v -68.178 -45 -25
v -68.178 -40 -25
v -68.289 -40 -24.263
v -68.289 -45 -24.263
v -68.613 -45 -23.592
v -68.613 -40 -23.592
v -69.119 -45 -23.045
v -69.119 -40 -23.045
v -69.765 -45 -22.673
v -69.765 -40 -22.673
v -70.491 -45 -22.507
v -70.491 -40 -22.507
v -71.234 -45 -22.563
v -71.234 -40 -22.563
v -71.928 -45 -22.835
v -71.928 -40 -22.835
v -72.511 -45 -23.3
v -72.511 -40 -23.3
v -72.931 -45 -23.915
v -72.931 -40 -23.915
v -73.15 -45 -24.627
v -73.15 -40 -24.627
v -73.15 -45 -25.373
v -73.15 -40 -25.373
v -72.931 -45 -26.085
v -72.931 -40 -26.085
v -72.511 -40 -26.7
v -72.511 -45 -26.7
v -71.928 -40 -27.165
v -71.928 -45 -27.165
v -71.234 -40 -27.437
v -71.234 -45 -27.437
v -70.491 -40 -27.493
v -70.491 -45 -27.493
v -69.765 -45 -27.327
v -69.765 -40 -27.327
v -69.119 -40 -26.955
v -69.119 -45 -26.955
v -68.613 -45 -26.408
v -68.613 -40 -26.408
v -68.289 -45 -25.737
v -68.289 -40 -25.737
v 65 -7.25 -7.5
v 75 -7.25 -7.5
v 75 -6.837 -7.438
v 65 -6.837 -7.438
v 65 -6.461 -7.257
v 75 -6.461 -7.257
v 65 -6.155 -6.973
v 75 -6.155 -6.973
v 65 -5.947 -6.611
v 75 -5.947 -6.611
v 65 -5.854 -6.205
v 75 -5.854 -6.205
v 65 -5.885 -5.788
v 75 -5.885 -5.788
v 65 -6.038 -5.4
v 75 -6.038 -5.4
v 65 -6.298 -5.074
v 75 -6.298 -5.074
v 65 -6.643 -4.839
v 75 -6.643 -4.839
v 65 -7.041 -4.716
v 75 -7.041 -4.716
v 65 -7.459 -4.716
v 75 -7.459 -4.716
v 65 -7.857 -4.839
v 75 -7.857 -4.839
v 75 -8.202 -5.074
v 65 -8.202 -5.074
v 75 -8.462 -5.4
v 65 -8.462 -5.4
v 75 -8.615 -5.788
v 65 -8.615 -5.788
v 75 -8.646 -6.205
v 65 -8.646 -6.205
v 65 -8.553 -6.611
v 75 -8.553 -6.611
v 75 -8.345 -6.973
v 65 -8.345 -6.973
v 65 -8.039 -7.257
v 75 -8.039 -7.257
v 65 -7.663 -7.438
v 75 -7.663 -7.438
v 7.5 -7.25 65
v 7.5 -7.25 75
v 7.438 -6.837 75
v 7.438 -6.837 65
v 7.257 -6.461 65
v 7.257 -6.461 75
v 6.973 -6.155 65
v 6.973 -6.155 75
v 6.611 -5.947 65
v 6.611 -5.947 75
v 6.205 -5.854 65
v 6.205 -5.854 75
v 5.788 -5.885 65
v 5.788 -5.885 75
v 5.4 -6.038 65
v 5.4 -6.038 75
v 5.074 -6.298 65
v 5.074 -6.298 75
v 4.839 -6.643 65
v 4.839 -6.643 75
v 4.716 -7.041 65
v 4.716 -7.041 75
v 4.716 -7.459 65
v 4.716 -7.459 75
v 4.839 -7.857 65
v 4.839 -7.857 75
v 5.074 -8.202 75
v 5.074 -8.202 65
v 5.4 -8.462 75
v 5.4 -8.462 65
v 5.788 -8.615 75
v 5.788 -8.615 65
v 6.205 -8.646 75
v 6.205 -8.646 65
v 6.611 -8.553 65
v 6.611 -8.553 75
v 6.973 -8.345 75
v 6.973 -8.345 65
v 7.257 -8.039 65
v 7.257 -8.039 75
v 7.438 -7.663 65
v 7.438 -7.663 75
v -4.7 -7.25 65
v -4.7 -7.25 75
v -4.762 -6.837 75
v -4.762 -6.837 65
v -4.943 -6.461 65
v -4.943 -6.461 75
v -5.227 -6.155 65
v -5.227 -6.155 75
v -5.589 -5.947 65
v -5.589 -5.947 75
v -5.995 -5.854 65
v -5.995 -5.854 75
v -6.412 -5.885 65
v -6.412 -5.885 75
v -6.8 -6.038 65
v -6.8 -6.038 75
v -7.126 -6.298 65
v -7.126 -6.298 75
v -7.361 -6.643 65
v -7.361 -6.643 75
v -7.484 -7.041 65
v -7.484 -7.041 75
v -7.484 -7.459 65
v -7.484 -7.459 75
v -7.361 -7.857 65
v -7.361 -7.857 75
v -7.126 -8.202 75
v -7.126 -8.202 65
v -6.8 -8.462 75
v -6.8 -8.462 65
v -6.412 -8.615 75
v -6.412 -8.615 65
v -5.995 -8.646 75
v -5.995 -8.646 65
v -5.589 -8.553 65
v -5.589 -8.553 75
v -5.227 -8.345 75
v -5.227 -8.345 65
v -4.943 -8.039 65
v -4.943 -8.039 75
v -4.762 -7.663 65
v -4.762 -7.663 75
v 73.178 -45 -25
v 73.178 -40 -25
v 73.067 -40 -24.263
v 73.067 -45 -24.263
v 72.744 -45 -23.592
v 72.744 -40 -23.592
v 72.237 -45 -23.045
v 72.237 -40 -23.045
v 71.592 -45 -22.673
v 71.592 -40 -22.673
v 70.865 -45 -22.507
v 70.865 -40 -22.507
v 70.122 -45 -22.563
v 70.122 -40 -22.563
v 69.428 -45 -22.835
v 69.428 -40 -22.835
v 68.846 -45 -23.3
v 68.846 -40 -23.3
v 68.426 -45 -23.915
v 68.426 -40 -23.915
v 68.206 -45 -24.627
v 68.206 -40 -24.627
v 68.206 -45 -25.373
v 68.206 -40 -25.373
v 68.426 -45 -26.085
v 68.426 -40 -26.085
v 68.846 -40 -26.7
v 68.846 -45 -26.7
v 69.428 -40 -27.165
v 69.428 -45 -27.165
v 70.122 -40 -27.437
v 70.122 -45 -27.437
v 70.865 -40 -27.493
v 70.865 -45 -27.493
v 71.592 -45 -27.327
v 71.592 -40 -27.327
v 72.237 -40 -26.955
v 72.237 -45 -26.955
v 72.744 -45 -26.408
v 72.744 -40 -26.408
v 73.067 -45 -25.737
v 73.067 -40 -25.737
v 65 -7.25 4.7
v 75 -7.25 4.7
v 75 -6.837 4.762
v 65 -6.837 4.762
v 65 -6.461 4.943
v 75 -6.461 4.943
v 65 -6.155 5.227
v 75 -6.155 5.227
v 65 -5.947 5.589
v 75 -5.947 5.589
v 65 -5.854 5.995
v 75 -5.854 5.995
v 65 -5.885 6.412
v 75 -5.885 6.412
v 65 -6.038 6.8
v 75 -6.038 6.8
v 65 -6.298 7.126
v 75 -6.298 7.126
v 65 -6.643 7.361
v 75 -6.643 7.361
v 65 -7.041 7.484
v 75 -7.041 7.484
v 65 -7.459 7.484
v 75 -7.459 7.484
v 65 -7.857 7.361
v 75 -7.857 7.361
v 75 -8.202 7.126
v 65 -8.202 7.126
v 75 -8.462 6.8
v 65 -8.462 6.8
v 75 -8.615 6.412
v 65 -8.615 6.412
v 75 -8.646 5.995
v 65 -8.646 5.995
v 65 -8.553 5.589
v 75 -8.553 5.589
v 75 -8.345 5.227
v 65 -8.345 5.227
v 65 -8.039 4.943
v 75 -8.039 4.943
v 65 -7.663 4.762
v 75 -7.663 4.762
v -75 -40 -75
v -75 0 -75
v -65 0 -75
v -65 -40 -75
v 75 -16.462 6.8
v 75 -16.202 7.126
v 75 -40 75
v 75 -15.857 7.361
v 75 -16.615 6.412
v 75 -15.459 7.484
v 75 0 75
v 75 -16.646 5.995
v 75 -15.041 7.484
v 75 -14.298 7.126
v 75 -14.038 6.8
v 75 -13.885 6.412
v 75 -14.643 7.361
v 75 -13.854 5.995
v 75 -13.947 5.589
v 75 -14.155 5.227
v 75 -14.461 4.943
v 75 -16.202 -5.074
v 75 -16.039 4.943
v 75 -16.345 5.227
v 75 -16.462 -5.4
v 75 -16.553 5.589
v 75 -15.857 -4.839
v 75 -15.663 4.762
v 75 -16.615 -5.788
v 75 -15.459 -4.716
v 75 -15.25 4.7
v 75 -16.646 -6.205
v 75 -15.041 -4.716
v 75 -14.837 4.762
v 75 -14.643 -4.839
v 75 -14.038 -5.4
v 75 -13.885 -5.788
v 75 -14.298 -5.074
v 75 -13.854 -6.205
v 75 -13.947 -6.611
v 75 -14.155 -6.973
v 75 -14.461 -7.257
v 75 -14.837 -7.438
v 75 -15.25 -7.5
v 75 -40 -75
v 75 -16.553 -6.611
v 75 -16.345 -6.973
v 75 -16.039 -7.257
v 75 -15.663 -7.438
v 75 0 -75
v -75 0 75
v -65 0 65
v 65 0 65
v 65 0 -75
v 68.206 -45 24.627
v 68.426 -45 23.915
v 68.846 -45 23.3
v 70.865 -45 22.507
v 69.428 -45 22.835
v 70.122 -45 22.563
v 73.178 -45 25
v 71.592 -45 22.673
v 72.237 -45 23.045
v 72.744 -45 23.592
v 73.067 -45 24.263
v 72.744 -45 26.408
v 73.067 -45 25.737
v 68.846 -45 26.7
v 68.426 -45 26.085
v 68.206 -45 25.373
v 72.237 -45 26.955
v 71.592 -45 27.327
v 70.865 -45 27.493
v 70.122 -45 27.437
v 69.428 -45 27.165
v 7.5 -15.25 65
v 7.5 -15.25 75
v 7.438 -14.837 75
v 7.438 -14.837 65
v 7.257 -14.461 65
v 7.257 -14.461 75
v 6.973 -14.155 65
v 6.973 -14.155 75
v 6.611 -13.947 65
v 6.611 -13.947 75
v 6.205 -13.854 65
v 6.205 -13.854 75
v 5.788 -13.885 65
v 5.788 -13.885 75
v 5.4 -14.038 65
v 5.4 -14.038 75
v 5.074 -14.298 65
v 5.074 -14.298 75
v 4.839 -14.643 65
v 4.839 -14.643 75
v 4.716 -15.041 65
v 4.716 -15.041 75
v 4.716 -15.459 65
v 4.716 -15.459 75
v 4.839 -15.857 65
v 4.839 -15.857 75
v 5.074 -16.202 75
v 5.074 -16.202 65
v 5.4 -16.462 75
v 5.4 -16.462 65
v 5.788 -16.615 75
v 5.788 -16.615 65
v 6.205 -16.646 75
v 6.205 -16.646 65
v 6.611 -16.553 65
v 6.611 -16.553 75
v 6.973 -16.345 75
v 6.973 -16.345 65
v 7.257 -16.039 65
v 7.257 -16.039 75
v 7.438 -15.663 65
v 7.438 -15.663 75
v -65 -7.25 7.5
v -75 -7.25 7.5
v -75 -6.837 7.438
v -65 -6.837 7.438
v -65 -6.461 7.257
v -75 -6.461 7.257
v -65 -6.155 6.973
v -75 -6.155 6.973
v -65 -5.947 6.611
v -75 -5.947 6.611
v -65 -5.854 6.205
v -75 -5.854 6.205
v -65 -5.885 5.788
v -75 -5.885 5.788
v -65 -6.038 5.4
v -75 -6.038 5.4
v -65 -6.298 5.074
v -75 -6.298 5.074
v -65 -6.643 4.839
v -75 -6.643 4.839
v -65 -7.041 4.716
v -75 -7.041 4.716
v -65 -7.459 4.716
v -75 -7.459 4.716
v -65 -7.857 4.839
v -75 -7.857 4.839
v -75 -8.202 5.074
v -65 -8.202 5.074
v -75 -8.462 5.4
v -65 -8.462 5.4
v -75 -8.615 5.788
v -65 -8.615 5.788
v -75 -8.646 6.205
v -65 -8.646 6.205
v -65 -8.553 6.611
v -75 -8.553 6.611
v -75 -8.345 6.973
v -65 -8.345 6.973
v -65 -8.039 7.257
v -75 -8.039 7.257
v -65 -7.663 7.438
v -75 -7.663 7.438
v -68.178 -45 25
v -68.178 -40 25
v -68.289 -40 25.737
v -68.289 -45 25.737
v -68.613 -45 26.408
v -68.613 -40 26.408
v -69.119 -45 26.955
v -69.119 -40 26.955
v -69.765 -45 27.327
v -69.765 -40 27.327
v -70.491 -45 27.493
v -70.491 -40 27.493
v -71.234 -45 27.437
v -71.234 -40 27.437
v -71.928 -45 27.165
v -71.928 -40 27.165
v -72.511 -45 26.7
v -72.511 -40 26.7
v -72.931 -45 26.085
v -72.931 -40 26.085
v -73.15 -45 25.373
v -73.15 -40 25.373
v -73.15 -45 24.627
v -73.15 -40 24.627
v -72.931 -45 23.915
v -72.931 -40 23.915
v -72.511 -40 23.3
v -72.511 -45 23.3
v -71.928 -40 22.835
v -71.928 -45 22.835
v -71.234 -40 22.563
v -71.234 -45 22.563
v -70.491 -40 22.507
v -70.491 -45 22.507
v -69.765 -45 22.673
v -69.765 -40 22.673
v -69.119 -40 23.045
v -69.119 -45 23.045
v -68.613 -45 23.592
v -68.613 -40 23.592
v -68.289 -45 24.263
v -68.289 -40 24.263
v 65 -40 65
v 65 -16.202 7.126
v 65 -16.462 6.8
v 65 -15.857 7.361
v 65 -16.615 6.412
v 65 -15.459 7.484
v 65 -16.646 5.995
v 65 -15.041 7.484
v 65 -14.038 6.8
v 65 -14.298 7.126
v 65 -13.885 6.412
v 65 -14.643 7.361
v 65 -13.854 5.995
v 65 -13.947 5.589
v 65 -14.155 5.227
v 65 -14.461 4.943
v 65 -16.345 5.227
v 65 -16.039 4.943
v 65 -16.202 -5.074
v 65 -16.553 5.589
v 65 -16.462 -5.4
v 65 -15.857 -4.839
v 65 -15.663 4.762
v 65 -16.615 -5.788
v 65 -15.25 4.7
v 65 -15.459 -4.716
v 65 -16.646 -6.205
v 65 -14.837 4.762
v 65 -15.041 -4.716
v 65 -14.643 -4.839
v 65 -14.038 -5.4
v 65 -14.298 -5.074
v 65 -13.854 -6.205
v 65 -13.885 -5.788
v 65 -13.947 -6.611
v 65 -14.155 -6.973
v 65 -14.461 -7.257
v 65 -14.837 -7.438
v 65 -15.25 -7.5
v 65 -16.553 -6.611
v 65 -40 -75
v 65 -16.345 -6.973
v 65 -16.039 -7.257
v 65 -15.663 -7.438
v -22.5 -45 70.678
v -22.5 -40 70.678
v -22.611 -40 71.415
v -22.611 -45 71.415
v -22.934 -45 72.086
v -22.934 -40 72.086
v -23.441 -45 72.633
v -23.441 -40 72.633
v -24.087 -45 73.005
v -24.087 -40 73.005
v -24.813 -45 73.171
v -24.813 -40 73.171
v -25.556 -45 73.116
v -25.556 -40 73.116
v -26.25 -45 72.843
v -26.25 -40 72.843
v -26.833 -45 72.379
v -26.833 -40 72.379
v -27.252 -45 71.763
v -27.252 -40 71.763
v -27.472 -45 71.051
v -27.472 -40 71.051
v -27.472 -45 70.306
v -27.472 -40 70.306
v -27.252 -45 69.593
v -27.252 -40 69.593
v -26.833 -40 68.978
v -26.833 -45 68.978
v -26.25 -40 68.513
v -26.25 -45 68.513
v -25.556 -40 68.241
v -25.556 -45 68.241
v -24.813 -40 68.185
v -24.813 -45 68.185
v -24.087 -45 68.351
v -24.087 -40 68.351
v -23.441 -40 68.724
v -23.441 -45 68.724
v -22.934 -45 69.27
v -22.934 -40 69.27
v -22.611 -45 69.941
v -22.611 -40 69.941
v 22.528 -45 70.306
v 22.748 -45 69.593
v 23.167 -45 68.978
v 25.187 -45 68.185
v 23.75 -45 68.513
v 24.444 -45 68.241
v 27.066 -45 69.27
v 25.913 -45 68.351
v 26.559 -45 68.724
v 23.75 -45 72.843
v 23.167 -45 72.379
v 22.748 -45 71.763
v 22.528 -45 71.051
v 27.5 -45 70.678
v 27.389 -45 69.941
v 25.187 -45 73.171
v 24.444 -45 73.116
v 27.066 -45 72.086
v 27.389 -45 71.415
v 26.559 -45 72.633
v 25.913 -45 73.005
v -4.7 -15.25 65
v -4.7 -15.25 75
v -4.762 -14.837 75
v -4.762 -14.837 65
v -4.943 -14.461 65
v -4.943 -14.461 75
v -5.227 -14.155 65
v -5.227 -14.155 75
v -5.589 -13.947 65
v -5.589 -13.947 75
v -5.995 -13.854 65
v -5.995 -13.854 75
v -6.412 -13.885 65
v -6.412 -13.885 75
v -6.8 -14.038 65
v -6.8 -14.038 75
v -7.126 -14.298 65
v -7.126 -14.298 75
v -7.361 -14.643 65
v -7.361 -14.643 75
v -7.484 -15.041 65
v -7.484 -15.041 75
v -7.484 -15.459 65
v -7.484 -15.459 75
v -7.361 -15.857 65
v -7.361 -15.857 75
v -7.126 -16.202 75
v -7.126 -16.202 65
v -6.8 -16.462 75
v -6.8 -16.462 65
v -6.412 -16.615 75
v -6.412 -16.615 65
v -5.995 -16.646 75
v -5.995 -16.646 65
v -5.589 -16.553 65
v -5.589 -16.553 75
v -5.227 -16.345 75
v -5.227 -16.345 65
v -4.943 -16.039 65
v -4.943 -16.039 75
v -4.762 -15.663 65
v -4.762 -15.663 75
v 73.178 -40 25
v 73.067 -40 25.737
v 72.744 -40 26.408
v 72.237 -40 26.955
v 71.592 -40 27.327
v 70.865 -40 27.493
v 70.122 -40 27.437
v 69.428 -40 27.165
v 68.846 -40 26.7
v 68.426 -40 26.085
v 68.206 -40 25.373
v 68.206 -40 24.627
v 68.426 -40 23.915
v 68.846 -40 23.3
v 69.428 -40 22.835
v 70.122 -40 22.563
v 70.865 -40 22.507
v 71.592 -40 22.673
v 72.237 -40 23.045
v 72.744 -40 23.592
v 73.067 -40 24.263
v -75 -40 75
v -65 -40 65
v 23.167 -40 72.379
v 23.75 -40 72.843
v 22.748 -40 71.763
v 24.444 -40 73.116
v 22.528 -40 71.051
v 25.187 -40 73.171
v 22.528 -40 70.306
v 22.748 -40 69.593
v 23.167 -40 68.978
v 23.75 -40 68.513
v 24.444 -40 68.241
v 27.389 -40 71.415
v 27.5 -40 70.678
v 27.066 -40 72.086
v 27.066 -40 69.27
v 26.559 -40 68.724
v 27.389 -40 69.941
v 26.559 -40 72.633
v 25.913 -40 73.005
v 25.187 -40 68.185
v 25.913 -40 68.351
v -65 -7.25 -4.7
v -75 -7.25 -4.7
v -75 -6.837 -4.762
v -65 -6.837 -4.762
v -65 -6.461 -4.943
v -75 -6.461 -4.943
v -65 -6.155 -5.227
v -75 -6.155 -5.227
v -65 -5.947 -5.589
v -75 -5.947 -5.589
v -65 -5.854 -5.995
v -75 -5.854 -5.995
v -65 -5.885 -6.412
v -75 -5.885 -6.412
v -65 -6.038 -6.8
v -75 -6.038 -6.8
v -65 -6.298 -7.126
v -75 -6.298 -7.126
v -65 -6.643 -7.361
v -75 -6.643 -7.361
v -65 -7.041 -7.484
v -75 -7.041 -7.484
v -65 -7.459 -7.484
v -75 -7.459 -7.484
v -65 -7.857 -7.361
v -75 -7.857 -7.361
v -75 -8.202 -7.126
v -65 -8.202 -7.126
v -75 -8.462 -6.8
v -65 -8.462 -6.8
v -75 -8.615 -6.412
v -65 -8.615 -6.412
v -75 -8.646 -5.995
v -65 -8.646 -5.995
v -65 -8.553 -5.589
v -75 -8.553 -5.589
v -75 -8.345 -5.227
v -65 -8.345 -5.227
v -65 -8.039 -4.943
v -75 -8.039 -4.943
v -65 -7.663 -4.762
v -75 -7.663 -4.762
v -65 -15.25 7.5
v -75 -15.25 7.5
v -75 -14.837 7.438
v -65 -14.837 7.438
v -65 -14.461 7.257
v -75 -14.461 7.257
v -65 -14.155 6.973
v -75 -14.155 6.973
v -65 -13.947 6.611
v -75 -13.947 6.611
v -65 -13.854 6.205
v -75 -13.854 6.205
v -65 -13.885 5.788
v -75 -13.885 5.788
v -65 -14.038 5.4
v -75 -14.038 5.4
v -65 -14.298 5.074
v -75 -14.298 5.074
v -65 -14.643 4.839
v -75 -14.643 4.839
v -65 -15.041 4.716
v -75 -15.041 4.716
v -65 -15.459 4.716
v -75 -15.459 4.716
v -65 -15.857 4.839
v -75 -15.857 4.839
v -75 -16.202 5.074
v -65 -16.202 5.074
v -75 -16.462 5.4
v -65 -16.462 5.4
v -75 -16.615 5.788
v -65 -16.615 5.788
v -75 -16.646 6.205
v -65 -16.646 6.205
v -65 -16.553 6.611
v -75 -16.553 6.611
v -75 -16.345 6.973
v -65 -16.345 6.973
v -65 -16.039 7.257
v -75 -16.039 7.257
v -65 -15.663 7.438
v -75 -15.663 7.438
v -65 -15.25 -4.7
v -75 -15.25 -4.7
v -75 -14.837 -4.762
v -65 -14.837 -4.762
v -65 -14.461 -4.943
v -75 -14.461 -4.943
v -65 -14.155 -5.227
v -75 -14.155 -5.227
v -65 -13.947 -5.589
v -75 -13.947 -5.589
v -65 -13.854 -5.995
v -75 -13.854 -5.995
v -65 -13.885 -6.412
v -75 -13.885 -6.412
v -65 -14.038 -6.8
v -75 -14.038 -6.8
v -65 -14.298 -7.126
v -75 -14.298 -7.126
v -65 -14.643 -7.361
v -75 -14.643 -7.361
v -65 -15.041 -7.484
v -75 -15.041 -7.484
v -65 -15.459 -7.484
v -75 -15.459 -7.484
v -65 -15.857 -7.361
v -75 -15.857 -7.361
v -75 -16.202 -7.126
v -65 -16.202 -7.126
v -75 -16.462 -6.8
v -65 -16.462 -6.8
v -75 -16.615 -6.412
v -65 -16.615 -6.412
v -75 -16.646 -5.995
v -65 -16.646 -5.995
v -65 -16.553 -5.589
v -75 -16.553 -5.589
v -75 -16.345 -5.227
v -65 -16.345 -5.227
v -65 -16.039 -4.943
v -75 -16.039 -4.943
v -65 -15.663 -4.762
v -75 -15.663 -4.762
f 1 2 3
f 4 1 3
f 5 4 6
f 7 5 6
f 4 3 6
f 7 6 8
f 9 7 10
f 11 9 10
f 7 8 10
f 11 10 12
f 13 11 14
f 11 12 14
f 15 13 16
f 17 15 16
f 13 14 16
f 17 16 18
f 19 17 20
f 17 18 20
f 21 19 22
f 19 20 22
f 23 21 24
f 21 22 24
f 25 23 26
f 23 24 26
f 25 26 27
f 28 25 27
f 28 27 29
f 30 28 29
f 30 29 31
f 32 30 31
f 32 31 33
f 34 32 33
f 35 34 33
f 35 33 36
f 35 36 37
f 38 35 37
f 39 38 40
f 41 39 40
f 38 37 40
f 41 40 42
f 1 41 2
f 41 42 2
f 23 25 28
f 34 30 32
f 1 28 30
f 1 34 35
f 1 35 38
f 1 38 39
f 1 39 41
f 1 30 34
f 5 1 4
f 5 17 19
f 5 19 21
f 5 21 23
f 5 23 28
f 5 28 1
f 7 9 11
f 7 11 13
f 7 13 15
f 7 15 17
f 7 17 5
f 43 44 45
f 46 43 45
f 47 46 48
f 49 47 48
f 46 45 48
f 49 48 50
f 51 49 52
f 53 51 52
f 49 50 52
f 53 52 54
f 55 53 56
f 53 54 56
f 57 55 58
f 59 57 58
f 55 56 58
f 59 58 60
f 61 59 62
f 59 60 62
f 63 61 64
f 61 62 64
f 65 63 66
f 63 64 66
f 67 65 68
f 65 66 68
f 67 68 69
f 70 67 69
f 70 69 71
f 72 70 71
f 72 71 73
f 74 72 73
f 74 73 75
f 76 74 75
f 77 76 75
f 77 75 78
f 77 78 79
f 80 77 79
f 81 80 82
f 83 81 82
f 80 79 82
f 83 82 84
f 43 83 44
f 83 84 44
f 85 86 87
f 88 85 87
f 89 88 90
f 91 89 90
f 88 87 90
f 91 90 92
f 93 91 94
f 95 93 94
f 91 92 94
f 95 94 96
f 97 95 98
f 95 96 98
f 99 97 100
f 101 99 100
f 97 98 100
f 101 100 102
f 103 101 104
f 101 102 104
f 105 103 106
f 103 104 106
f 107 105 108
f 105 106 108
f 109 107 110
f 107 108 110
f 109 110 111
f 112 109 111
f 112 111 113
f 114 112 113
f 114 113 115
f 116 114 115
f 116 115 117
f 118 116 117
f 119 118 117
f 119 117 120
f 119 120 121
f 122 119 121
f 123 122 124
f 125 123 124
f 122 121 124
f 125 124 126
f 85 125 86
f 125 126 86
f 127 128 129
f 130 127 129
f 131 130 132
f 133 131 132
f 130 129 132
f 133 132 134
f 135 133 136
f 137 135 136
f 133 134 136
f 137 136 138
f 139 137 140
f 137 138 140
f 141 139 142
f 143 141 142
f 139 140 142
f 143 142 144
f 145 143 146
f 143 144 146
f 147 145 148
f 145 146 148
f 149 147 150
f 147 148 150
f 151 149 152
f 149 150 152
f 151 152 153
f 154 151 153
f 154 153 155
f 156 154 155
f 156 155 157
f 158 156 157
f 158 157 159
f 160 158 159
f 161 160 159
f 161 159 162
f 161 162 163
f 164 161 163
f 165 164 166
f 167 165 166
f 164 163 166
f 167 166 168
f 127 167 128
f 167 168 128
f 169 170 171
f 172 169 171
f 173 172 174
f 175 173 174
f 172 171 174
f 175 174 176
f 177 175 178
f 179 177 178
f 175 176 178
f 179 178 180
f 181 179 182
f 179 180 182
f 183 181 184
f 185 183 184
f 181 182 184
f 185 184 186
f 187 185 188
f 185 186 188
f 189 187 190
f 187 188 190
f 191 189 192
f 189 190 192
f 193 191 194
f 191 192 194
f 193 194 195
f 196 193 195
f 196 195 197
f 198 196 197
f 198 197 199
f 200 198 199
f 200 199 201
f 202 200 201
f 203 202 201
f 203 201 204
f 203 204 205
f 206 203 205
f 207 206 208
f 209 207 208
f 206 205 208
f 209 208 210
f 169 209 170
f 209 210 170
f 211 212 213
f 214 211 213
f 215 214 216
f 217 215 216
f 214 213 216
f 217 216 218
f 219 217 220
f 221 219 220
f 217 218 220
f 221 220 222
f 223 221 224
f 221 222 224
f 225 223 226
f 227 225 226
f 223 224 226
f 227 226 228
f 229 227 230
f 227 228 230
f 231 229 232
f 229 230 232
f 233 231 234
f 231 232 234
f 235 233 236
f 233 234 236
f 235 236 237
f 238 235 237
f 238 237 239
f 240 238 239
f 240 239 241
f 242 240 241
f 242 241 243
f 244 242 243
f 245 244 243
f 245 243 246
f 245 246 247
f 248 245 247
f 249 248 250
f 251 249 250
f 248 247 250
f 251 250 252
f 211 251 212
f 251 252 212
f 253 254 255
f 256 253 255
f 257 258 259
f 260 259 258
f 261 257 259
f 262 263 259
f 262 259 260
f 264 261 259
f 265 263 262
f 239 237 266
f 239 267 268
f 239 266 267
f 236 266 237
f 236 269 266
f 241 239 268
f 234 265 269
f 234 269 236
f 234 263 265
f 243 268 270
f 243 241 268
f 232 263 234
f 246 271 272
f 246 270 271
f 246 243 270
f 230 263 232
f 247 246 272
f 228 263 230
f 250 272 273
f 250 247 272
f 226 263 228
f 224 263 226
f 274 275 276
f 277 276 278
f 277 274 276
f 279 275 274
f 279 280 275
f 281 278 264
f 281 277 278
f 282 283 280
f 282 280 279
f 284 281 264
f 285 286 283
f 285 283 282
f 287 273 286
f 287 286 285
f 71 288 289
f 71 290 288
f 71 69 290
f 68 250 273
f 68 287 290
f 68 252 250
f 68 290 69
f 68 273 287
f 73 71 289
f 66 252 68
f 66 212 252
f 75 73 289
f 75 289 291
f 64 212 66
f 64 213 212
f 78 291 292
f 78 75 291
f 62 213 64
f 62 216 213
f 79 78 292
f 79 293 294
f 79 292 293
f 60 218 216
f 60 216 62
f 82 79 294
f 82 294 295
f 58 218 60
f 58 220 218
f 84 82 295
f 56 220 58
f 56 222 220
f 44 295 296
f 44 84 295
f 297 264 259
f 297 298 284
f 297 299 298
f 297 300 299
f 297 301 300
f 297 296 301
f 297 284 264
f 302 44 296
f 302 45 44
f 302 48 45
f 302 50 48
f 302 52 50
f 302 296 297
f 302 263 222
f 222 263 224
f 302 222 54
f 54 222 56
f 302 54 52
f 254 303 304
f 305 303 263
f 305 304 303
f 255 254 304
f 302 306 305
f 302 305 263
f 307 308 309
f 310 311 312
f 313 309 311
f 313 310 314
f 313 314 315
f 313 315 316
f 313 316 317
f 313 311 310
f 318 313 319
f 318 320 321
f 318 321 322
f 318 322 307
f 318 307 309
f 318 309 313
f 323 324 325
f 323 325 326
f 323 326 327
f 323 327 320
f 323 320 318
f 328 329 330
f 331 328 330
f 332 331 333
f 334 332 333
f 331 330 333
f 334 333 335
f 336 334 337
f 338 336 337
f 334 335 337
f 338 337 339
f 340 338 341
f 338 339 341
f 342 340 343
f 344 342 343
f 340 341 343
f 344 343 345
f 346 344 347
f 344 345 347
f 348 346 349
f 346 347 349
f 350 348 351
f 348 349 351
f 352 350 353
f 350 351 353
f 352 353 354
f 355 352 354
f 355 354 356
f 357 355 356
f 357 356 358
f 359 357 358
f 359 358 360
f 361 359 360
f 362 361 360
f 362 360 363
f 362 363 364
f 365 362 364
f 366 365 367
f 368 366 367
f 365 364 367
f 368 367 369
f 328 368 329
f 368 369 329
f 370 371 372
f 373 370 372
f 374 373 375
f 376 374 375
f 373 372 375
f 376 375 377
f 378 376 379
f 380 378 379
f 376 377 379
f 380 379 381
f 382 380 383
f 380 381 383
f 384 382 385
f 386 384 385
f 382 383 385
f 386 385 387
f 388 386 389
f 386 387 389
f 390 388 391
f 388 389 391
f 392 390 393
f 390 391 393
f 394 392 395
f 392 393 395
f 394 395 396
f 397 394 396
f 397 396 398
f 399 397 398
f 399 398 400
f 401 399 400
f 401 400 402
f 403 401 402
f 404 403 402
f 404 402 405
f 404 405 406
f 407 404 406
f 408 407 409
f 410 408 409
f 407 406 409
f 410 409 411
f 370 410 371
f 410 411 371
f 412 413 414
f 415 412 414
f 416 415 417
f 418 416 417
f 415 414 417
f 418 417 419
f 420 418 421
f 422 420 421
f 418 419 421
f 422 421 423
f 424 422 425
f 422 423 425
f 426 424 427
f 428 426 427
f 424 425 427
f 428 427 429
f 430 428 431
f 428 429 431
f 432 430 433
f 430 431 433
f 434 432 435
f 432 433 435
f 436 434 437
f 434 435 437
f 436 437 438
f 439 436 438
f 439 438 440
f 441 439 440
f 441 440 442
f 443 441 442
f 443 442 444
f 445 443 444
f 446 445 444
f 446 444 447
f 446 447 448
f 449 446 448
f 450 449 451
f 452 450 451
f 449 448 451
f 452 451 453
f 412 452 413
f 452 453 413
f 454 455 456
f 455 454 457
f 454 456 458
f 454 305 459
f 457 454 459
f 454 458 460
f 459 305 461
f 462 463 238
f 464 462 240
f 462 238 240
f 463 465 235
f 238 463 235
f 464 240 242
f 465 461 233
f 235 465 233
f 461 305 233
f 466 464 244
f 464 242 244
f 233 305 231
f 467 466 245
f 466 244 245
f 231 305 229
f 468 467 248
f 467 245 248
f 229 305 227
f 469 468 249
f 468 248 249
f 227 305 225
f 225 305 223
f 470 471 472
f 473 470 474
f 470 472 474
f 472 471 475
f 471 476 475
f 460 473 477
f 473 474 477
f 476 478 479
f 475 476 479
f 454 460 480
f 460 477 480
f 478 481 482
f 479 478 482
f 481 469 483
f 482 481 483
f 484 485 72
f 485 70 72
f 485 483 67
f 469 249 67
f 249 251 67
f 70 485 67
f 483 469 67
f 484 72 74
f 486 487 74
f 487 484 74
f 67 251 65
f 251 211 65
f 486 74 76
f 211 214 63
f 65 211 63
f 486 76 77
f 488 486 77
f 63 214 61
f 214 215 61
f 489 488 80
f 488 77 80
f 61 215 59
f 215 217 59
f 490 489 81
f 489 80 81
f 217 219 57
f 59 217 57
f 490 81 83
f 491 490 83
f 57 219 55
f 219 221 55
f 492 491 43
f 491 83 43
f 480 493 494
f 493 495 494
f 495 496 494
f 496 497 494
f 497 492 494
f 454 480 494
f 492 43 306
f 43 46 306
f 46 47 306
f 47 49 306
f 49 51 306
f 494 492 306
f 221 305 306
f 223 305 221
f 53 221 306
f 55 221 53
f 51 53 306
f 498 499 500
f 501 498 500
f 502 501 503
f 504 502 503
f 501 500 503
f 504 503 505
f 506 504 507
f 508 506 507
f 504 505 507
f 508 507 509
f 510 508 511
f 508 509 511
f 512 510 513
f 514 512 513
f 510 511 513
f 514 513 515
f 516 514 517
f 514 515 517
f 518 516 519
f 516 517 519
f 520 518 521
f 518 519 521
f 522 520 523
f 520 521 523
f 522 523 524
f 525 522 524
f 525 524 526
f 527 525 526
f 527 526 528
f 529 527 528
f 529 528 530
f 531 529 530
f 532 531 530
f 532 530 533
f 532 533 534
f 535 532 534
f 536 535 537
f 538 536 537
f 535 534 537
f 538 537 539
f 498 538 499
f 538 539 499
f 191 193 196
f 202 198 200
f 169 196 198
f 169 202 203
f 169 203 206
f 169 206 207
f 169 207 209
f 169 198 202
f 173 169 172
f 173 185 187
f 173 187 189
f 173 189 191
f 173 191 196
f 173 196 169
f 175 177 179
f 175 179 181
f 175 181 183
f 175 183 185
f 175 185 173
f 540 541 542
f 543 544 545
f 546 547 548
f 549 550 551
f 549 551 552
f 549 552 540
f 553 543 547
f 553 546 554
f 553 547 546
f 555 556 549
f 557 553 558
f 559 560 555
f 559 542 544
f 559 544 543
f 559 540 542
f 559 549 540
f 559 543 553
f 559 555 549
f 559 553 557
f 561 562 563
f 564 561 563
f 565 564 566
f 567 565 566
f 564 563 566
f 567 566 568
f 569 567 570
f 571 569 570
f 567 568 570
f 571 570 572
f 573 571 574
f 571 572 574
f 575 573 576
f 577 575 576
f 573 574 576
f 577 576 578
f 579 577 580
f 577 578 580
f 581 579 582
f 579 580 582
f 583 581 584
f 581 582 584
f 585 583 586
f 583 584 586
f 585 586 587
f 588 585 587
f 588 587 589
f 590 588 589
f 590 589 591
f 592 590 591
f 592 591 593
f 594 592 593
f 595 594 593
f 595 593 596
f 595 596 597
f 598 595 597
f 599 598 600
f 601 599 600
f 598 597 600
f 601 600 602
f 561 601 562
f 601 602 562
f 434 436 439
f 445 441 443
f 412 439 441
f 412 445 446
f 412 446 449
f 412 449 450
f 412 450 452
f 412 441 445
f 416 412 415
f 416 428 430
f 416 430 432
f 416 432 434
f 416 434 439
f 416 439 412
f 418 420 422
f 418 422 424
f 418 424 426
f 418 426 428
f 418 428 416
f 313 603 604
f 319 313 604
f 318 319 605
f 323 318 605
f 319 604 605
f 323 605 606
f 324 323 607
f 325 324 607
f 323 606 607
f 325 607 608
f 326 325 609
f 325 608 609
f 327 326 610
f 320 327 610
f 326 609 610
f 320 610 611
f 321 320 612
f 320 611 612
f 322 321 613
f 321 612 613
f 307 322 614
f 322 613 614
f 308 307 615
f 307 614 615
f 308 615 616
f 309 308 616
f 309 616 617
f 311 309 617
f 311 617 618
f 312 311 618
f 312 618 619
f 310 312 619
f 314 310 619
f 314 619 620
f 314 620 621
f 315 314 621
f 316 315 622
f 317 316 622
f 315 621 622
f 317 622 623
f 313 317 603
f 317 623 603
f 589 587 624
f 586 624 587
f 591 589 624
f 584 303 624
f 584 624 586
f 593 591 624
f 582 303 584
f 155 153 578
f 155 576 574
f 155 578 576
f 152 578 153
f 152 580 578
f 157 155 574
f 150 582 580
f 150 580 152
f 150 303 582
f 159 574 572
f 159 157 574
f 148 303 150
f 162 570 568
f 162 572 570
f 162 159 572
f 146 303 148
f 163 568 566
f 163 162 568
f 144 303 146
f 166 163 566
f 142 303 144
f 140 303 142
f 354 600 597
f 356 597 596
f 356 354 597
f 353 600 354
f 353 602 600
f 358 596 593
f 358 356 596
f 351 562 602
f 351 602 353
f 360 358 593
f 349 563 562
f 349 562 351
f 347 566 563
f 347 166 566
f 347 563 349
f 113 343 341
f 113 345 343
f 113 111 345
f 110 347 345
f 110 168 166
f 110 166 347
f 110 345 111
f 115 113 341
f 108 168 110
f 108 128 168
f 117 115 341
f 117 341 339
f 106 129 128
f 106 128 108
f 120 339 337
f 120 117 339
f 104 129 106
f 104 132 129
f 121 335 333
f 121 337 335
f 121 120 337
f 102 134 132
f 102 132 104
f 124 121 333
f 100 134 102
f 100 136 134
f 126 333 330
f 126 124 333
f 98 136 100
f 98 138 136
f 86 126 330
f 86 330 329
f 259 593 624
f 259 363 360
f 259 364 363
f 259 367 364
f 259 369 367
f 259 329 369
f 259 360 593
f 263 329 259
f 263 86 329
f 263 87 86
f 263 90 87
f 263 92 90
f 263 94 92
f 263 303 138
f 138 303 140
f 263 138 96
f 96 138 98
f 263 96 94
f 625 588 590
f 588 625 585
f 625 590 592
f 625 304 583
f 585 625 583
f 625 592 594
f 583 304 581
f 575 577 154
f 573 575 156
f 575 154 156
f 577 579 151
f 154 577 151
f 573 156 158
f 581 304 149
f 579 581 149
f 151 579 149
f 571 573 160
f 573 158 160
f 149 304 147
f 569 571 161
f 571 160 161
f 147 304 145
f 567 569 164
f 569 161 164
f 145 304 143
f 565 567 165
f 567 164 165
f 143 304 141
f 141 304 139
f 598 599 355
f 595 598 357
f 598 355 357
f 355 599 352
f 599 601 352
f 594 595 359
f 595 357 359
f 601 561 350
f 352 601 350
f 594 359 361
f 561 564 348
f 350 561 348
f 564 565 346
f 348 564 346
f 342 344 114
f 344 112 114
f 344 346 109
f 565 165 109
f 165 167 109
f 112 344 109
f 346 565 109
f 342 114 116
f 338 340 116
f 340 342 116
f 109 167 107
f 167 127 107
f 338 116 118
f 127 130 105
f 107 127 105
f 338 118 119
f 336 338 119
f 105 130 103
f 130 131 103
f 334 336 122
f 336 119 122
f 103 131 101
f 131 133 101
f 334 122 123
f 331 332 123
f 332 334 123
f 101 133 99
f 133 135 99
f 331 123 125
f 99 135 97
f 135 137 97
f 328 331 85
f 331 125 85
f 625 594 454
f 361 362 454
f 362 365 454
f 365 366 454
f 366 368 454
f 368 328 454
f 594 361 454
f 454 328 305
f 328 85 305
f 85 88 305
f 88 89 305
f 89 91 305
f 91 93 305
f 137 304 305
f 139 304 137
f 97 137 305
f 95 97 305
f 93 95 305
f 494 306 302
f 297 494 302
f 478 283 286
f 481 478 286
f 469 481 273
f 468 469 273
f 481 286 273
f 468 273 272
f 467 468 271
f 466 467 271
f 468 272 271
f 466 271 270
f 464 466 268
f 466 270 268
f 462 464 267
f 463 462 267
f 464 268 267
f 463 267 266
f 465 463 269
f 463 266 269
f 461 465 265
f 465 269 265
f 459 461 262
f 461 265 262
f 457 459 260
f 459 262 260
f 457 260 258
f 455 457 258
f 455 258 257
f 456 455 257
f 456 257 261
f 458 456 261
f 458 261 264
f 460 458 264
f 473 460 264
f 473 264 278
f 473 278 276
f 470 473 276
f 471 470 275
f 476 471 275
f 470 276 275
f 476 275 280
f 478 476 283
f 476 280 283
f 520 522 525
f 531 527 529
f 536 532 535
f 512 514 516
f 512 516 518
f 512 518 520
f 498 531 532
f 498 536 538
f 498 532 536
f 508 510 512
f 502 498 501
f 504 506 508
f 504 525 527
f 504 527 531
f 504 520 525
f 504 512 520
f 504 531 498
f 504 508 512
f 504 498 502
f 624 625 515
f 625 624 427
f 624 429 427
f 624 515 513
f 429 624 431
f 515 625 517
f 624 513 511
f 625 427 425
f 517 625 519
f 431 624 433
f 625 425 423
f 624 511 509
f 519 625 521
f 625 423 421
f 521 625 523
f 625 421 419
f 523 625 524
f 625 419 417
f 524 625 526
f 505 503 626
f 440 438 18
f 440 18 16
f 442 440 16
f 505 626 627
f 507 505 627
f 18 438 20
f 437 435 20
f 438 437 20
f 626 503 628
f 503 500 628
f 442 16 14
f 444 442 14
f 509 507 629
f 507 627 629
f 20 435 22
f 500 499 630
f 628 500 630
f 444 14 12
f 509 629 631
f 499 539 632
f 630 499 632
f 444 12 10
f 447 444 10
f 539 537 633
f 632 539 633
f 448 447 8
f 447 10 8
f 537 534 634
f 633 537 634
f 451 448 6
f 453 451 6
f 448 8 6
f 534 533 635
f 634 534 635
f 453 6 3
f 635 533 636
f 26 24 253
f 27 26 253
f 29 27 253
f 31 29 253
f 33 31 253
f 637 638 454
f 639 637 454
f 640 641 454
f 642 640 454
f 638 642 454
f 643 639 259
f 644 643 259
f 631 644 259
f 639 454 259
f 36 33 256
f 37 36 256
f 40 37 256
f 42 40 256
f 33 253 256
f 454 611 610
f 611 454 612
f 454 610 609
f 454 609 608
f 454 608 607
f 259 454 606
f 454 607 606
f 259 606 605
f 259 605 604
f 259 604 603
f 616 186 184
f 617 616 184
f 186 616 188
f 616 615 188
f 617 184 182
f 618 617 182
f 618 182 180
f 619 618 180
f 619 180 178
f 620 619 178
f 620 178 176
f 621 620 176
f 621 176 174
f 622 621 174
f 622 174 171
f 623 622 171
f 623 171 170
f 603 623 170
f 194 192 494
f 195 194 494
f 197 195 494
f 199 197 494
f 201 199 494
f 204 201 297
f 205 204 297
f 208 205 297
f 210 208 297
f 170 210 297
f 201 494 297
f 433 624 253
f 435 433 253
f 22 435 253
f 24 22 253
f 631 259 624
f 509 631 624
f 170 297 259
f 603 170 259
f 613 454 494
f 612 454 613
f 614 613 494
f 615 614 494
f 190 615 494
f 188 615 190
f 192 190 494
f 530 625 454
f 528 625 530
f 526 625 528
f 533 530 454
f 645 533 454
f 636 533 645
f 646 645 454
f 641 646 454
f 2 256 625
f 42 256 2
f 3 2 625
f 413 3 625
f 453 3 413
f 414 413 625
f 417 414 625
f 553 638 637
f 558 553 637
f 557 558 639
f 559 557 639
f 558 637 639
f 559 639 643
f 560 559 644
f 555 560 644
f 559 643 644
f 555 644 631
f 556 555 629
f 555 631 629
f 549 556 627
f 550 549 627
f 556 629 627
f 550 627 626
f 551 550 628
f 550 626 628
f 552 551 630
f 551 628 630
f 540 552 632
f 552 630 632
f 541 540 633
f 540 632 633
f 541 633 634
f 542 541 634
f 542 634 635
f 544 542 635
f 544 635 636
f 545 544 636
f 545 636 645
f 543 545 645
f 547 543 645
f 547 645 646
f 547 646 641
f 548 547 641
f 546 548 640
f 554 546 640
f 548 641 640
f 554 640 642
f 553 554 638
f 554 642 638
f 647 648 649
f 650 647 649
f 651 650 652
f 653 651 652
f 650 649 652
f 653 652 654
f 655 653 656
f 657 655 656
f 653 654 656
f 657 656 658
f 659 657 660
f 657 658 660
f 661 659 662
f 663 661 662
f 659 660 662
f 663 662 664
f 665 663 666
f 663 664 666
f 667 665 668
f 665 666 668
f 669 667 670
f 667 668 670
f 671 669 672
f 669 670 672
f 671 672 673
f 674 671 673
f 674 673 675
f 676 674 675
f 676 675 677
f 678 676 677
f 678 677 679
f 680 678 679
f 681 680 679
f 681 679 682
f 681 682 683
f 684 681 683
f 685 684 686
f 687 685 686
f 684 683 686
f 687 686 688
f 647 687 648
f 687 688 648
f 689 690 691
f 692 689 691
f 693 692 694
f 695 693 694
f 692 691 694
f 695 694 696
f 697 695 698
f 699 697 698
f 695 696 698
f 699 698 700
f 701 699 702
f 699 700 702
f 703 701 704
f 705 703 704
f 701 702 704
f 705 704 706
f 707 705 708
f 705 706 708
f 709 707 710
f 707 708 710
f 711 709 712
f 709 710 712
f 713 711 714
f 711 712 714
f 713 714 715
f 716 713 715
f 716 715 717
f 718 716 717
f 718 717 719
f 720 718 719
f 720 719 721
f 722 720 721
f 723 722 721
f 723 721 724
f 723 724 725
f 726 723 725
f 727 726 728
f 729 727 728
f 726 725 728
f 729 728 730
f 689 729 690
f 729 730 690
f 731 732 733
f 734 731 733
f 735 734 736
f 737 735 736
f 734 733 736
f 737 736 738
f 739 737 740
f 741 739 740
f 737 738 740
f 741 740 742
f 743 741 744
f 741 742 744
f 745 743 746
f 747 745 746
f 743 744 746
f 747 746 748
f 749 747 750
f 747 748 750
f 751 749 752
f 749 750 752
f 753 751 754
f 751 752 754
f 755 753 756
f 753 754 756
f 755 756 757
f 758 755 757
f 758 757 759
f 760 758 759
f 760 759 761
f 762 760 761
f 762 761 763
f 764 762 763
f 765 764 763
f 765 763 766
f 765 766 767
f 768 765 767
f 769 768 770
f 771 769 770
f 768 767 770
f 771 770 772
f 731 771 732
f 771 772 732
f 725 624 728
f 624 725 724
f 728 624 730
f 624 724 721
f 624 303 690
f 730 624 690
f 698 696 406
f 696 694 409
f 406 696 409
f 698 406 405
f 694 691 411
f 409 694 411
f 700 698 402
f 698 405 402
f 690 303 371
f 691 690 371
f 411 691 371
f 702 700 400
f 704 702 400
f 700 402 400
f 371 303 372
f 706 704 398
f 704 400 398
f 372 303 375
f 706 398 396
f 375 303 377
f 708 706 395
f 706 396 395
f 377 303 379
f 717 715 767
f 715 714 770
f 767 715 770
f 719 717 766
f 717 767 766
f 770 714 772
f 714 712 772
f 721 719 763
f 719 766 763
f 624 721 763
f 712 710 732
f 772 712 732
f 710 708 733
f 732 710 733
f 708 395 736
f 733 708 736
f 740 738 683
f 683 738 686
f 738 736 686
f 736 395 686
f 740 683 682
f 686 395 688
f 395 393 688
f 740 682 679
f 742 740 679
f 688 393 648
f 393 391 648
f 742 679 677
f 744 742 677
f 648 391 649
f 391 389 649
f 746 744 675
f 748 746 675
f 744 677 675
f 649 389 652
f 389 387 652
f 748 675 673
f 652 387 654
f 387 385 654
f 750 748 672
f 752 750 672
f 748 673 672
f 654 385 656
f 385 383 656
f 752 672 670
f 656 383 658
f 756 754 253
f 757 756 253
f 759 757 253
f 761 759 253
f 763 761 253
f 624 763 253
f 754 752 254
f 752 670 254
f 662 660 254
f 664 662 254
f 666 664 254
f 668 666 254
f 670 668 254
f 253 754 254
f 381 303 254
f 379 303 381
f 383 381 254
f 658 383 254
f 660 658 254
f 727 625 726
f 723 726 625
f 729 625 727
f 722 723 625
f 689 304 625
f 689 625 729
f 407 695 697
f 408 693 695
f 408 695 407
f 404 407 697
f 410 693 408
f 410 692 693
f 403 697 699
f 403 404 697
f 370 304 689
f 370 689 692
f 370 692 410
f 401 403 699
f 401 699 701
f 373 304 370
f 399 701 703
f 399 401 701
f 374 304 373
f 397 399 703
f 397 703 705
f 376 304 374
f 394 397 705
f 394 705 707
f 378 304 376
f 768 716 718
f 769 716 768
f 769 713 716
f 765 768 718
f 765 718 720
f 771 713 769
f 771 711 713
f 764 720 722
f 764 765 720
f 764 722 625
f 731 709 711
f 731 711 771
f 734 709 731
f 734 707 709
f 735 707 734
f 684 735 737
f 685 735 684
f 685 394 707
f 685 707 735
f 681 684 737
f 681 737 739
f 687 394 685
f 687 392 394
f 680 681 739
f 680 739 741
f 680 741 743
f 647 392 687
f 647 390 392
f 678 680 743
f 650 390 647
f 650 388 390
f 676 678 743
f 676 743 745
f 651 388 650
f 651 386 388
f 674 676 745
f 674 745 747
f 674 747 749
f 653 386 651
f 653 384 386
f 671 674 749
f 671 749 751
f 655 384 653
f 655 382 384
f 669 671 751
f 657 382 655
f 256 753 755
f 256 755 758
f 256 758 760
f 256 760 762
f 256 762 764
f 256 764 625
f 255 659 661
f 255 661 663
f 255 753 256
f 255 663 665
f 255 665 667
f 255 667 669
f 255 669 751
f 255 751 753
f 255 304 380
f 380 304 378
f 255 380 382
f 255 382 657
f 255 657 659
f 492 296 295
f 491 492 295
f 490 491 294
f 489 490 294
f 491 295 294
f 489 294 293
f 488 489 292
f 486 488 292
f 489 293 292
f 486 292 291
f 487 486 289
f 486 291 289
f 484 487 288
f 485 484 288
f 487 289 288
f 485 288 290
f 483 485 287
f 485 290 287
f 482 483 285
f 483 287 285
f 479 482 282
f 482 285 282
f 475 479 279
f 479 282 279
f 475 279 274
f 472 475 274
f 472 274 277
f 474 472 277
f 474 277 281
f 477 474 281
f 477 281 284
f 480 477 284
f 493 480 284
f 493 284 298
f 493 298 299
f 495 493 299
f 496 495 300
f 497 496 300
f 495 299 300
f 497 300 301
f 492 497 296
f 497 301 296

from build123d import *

# Parameters (mm, degrees)
SKETCH1_W           = 150
SKETCH1_H           = 150
BOSS_EXTRUDE1_DEPTH = 40
SKETCH2_W           = 130
SKETCH2_H           = 130
CUT_EXTRUDE1_DEPTH  = 54
SKETCH6_R           = 2.5
BOSS_EXTRUDE5_DEPTH = 5
SKETCH9_R           = 1.4
CUT_EXTRUDE4_DEPTH  = 10
CIRPATTERN1_COUNT   = 3
CIRPATTERN1_ANGLE   = 180
SKETCH10_W          = 130
SKETCH10_H          = 96.398295943
CUT_EXTRUDE6_DEPTH  = 46


with BuildPart() as part:
    # Sketch1 → Boss-Extrude1 (new body)
    with BuildSketch(Plane(origin=(0, 0, 0), x_dir=(1, 0, 0), z_dir=(0, 1, 0))):
        Rectangle(SKETCH1_W, SKETCH1_H)
    extrude(amount=-BOSS_EXTRUDE1_DEPTH)

    # Sketch2 → Cut-Extrude1 (cut)
    with BuildSketch(Plane(origin=(0, 0, 0), x_dir=(1, 0, 0), z_dir=(0, 1, 0))):
        Rectangle(SKETCH2_W, SKETCH2_H)
    extrude(amount=-CUT_EXTRUDE1_DEPTH, mode=Mode.SUBTRACT)

    # Sketch6 → Boss-Extrude5 (add)
    with BuildSketch(Plane.XZ.offset(40)):
        with Locations((-70.678187872, -25)):
            Circle(SKETCH6_R)
        with Locations((-70.678187872, 25)):
            Circle(SKETCH6_R)
        with Locations((25, 70.678187872)):
            Circle(SKETCH6_R)
        with Locations((-25, 70.678187872)):
            Circle(SKETCH6_R)
        with Locations((70.678187872, -25)):
            Circle(SKETCH6_R)
        with Locations((70.678187872, 25)):
            Circle(SKETCH6_R)
        with Locations((-25, -70.678187872)):
            Circle(SKETCH6_R)
        with Locations((25, -70.678187872)):
            Circle(SKETCH6_R)
    extrude(amount=BOSS_EXTRUDE5_DEPTH)

    # Sketch9 → Cut-Extrude4 (cut)
    with BuildSketch(Plane.ZY.offset(75)):
        with Locations((-6.1, -7.25)):
            Circle(SKETCH9_R)
        with Locations((6.1, -7.25)):
            Circle(SKETCH9_R)
        with Locations((6.1, -15.25)):
            Circle(SKETCH9_R)
        with Locations((-6.1, -15.25)):
            Circle(SKETCH9_R)
    cut_extrude4 = extrude(amount=-CUT_EXTRUDE4_DEPTH, mode=Mode.SUBTRACT)

    # CirPattern1: Cut-Extrude4 ×3 about axis
    cirpattern1_axis = Axis((0, 0, 0), (0, 1, 0))
    for i in range(1, CIRPATTERN1_COUNT):
        add(cut_extrude4.rotate(cirpattern1_axis, i * CIRPATTERN1_ANGLE / (CIRPATTERN1_COUNT - 1)), mode=Mode.SUBTRACT)

    # Sketch10 → Cut-Extrude6 (cut, through all)
    with BuildSketch(Plane(origin=(0, 0, 0), x_dir=(1, 0, 0), z_dir=(0, 1, 0))):
        with Locations((0, 113.199147972)):
            Rectangle(SKETCH10_W, SKETCH10_H)
    extrude(amount=-CUT_EXTRUDE6_DEPTH, mode=Mode.SUBTRACT)


solid = part.part
